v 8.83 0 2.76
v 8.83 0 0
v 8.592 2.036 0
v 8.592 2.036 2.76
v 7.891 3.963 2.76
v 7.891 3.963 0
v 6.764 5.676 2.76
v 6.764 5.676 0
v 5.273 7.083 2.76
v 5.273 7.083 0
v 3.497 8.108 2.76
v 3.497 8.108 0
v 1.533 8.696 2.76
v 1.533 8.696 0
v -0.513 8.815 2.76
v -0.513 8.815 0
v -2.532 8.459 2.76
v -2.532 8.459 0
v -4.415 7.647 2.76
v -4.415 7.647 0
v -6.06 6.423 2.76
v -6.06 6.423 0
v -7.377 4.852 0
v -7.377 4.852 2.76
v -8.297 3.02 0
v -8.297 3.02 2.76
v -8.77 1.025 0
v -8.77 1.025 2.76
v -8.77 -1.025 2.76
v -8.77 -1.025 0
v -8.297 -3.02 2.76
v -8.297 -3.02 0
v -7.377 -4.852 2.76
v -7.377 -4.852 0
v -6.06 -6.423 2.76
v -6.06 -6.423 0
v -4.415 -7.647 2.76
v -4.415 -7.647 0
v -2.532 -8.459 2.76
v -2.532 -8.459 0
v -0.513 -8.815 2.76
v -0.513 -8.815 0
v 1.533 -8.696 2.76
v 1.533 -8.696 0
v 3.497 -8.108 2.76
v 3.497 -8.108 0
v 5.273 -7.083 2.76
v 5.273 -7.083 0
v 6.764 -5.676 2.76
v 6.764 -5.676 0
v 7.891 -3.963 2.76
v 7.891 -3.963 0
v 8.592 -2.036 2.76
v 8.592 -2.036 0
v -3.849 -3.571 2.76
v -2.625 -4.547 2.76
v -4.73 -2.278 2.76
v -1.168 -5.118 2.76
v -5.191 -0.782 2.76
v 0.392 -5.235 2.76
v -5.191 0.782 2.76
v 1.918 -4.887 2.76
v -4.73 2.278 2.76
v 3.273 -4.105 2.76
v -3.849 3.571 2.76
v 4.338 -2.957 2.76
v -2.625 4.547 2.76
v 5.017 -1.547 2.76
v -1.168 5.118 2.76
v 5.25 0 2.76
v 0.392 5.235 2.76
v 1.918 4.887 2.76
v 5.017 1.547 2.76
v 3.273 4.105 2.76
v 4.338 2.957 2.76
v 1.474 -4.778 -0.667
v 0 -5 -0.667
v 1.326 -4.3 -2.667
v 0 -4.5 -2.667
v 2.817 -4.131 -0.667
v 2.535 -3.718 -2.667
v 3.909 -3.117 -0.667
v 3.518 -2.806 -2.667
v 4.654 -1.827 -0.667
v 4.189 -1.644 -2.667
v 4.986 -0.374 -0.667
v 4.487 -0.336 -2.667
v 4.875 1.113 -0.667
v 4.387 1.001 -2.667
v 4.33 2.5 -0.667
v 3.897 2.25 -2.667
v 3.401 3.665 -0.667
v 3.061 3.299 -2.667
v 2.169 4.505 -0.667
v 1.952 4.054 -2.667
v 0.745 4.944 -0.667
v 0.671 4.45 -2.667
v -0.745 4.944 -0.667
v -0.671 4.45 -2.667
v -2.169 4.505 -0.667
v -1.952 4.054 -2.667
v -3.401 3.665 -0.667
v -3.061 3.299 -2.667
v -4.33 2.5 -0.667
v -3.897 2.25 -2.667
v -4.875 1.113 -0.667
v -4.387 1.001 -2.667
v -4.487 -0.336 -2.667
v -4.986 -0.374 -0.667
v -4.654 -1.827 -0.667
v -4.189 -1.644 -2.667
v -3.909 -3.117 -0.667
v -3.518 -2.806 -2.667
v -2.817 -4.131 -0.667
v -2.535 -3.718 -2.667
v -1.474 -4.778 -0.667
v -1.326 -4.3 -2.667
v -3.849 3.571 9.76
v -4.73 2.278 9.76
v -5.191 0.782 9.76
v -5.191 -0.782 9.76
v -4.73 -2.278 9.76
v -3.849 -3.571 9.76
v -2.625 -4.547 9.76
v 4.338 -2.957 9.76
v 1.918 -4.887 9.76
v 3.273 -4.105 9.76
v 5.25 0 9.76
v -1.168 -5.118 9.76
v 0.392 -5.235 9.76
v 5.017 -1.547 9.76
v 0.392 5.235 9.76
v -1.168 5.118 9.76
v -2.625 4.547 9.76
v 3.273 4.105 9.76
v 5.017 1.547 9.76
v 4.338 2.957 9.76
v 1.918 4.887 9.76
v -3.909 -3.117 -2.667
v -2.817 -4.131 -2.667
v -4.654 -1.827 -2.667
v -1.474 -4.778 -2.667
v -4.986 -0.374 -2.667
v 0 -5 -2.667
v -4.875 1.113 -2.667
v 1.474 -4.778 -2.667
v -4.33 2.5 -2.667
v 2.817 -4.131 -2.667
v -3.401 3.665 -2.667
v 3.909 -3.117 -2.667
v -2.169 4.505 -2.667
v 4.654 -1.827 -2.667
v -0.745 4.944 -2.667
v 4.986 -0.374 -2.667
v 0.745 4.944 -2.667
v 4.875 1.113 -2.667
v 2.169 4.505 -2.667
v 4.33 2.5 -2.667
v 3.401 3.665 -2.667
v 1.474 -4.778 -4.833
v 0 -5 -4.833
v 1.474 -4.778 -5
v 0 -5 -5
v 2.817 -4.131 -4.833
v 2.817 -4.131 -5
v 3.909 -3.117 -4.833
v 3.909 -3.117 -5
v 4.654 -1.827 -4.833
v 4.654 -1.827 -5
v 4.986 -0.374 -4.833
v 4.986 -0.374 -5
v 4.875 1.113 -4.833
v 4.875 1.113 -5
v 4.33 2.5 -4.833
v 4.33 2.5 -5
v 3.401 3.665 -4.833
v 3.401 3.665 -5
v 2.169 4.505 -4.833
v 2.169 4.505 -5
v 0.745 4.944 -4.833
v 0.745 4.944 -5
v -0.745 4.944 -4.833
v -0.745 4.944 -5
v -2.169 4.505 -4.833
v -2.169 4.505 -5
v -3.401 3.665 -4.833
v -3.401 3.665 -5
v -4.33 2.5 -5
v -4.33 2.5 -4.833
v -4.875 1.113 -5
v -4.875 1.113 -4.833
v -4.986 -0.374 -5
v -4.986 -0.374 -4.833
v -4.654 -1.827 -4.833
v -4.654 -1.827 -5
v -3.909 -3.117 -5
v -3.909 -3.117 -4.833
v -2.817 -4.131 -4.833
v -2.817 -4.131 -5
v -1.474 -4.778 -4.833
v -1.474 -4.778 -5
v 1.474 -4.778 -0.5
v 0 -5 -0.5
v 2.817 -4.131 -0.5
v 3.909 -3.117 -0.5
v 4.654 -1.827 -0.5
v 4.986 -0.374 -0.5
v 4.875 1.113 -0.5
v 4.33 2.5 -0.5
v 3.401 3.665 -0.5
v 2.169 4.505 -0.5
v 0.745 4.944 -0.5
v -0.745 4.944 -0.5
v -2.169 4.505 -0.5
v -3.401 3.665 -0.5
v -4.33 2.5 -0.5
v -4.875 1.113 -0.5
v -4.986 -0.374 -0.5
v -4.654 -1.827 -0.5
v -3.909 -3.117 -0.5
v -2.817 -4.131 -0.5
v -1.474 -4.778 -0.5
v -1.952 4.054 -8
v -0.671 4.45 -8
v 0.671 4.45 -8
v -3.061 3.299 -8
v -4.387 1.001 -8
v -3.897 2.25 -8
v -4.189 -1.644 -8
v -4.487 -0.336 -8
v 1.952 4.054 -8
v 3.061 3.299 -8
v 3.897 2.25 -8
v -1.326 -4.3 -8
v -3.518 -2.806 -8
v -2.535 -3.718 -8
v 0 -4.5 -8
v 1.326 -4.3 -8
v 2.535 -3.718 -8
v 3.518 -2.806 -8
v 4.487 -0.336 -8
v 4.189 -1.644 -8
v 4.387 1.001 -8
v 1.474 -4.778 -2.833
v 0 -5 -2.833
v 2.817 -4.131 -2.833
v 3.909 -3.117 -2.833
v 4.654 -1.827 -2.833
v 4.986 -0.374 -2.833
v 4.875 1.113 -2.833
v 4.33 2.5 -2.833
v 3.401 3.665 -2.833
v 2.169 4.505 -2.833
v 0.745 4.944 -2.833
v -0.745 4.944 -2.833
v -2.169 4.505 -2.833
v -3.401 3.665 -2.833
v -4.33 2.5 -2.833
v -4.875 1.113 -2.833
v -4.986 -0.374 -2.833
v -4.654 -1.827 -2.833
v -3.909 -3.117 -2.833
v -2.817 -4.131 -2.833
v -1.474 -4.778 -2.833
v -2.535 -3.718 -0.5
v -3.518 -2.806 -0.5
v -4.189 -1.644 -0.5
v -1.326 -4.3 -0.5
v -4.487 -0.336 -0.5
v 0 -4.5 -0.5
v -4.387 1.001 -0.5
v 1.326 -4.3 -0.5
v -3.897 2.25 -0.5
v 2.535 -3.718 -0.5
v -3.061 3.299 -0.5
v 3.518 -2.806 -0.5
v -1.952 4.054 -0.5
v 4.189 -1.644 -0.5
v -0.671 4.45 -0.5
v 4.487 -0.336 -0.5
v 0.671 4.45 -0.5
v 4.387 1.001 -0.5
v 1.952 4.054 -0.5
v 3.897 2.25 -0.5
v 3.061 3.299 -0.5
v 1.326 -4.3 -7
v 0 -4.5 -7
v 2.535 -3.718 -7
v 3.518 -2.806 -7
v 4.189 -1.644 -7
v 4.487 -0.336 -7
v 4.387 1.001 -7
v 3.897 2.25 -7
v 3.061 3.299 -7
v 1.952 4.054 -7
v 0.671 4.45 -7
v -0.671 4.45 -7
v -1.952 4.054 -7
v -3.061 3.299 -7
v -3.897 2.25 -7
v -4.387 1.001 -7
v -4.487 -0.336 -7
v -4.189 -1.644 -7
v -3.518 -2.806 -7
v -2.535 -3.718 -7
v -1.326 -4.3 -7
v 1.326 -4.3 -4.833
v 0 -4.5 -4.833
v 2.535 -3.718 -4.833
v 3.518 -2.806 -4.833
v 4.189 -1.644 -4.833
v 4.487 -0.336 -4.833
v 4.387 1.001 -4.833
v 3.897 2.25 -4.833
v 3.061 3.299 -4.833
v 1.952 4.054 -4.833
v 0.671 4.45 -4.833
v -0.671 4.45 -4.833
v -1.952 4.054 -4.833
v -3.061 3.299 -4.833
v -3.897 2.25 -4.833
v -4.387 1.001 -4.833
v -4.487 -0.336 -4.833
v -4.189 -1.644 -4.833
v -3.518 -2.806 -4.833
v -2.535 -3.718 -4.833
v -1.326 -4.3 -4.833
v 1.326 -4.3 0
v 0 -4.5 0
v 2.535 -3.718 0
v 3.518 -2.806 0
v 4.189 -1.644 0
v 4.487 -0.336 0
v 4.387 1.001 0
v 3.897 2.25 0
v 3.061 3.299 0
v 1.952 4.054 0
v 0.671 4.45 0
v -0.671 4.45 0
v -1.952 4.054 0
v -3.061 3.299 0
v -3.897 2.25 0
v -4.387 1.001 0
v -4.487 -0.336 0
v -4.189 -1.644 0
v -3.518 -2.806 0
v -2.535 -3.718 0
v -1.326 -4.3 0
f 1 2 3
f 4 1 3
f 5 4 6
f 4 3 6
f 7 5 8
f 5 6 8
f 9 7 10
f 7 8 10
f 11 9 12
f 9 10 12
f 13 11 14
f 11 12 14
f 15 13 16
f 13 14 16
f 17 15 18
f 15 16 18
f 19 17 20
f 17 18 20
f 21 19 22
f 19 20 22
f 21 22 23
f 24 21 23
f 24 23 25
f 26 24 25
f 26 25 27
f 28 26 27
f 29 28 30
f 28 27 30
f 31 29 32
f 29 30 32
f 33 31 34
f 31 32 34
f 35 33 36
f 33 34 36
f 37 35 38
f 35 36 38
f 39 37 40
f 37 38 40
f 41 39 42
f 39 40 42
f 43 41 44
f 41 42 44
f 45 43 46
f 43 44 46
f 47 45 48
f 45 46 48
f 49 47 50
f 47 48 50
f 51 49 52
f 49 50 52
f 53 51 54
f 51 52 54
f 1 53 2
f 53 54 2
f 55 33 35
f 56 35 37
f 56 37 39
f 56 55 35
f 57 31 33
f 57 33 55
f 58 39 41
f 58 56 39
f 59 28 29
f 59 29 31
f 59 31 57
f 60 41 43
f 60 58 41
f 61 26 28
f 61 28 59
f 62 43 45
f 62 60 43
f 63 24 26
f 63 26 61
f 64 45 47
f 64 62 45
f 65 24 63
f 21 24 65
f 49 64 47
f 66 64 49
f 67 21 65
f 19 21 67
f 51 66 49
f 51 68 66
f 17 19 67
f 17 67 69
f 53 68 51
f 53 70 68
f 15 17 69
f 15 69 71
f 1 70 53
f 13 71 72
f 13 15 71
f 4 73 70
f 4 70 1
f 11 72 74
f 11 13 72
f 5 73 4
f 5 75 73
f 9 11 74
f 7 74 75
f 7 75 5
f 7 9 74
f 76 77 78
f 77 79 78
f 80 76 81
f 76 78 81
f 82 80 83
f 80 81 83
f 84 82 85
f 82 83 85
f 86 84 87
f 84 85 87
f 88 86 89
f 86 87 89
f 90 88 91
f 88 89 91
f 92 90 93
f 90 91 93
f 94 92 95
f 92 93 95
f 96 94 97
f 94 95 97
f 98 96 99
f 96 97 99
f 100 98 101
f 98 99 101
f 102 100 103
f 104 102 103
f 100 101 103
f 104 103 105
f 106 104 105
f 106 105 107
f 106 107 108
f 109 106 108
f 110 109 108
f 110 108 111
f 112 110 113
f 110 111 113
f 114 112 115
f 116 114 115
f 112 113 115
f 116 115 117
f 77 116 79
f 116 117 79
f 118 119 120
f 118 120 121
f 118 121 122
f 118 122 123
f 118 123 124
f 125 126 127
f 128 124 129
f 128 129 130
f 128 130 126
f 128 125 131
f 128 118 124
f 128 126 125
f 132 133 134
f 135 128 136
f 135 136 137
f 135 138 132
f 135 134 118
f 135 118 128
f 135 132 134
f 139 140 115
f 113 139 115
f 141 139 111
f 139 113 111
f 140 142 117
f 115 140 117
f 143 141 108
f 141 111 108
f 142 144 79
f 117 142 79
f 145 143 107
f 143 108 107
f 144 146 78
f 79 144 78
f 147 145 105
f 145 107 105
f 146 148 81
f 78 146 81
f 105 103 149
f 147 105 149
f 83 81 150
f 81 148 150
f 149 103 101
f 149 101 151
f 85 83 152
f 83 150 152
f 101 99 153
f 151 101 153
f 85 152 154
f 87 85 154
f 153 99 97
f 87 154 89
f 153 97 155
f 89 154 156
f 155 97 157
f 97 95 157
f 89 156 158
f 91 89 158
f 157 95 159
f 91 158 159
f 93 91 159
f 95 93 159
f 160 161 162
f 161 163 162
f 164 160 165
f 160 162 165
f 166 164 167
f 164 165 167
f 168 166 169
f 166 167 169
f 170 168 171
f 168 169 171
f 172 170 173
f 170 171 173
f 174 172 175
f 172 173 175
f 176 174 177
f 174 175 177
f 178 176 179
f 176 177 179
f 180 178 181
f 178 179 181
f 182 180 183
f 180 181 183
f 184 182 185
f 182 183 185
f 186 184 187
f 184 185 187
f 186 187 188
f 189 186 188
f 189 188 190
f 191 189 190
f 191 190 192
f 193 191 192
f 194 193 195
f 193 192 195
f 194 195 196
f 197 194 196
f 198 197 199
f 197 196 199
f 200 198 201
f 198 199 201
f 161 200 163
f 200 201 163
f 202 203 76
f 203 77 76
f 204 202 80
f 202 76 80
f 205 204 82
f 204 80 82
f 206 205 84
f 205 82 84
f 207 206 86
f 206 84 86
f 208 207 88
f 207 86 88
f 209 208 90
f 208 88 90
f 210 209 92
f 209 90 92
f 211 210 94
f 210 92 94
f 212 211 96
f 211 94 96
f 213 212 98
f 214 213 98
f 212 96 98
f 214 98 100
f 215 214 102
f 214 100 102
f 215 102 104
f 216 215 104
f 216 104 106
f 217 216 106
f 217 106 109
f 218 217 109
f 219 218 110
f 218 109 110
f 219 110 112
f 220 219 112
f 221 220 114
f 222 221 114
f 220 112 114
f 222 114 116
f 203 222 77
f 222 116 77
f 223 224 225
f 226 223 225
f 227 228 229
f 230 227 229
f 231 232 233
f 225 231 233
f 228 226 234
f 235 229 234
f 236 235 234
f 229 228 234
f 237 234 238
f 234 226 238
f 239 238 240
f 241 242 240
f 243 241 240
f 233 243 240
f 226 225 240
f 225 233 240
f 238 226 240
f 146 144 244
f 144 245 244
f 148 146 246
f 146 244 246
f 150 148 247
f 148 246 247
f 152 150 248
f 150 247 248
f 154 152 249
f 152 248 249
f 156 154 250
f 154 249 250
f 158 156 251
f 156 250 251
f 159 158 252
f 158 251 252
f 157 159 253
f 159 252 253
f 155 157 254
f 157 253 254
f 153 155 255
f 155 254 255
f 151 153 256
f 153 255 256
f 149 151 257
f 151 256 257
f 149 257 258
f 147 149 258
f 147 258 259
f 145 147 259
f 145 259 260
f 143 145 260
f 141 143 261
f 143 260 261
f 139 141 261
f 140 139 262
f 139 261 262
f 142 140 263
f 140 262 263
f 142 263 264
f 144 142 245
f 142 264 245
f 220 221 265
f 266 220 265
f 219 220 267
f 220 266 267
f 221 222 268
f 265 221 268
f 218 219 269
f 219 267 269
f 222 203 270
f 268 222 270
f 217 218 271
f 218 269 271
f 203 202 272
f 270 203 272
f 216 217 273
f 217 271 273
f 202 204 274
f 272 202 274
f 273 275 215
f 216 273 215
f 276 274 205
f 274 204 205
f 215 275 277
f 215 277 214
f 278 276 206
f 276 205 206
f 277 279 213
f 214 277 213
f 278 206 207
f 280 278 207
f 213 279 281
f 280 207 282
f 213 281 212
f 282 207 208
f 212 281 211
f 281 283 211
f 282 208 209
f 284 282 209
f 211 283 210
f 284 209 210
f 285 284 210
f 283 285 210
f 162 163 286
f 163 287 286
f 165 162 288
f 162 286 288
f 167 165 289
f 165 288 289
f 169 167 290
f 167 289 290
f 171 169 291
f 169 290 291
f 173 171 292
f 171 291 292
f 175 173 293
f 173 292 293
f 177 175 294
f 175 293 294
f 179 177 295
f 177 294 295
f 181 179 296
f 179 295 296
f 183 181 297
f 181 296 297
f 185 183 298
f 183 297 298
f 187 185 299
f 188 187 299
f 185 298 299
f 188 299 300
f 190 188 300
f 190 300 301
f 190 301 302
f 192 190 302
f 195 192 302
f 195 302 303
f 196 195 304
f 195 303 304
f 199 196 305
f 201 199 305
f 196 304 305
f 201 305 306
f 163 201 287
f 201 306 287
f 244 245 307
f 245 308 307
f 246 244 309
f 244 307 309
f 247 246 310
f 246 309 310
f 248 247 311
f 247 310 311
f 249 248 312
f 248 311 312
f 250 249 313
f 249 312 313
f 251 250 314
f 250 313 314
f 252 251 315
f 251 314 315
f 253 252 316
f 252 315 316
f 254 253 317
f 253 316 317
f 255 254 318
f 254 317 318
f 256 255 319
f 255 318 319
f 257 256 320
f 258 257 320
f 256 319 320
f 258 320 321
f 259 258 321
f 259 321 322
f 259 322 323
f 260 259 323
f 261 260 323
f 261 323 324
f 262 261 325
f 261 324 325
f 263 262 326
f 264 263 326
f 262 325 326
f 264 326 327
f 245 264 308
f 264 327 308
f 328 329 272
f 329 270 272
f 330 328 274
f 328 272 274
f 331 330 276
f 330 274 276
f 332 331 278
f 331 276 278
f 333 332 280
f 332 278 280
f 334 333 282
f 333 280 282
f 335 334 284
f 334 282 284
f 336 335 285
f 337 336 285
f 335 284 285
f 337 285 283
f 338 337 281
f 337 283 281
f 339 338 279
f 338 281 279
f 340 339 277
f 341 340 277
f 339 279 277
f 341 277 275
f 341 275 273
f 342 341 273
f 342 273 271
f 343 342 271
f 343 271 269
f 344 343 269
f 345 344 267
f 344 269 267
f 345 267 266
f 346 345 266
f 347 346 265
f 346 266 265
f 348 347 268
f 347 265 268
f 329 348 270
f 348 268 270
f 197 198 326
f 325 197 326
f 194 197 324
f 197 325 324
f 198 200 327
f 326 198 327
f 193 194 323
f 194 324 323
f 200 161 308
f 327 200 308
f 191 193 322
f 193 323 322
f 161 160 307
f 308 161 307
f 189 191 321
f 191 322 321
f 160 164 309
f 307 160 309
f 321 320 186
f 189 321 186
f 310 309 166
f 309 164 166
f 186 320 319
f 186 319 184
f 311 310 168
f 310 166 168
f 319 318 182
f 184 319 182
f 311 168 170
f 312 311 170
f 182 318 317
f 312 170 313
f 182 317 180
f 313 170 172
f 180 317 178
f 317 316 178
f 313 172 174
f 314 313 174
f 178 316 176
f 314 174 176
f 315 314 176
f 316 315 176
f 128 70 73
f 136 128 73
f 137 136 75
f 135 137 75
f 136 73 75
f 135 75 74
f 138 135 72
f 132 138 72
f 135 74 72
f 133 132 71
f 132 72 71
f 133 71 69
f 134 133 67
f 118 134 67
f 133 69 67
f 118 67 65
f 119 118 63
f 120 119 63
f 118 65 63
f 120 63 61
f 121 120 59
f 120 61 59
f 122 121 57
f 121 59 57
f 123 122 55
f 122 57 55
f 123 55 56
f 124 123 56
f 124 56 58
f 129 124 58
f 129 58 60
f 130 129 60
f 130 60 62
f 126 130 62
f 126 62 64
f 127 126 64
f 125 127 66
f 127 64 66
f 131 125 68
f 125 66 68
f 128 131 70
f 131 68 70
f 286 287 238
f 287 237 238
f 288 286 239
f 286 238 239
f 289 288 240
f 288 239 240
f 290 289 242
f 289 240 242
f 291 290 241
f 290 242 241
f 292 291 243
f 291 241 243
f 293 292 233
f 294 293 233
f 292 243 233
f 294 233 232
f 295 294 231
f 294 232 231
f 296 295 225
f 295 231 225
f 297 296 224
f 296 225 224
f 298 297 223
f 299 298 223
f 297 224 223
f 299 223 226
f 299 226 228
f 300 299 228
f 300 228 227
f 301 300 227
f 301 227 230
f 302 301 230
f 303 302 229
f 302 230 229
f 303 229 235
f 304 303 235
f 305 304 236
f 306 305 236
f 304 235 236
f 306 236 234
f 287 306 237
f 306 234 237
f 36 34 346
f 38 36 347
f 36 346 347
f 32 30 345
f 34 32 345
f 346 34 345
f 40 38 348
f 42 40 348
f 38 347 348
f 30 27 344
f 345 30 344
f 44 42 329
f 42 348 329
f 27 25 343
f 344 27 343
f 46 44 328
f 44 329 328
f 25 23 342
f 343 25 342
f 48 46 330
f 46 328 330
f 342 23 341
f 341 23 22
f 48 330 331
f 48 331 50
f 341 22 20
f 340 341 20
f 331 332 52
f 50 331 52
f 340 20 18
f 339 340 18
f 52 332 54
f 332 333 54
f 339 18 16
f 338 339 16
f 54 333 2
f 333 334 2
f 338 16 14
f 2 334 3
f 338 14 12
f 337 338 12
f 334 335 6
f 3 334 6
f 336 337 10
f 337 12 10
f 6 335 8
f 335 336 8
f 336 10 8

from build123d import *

# Parameters (mm, degrees)
F0_R     = 8.83
F1_DEPTH = 2.76
F4_R     = 5.25
F5_DEPTH = 7


with BuildPart() as f1:
    # F0 (on Top) → F1 (new body)
    with BuildSketch(Plane.XY):
        Circle(F0_R)
    extrude(amount=F1_DEPTH)

    # F2 (on Right) → F3 (revolve)
    with BuildSketch(Plane.YZ):
        Polygon((0, -8), (0, 0), (-4.5, 0), (-4.5, -0.5), (-5, -0.5), (-5, -0.666667), (-4.5, -2.666667), (-5, -2.666667), (-5, -2.833333), (-4.5, -4.833333), (-5, -4.833333), (-5, -5), (-4.5, -7), (-4.5, -8), align=None)
    revolve(axis=Axis((0, 0, -4), (0, 0, 1)))

    # F4 (on face) → F5 (join)
    with BuildSketch(Plane.XY.offset(2.76)):
        Circle(F4_R)
    extrude(amount=F5_DEPTH)


solid = f1.part
